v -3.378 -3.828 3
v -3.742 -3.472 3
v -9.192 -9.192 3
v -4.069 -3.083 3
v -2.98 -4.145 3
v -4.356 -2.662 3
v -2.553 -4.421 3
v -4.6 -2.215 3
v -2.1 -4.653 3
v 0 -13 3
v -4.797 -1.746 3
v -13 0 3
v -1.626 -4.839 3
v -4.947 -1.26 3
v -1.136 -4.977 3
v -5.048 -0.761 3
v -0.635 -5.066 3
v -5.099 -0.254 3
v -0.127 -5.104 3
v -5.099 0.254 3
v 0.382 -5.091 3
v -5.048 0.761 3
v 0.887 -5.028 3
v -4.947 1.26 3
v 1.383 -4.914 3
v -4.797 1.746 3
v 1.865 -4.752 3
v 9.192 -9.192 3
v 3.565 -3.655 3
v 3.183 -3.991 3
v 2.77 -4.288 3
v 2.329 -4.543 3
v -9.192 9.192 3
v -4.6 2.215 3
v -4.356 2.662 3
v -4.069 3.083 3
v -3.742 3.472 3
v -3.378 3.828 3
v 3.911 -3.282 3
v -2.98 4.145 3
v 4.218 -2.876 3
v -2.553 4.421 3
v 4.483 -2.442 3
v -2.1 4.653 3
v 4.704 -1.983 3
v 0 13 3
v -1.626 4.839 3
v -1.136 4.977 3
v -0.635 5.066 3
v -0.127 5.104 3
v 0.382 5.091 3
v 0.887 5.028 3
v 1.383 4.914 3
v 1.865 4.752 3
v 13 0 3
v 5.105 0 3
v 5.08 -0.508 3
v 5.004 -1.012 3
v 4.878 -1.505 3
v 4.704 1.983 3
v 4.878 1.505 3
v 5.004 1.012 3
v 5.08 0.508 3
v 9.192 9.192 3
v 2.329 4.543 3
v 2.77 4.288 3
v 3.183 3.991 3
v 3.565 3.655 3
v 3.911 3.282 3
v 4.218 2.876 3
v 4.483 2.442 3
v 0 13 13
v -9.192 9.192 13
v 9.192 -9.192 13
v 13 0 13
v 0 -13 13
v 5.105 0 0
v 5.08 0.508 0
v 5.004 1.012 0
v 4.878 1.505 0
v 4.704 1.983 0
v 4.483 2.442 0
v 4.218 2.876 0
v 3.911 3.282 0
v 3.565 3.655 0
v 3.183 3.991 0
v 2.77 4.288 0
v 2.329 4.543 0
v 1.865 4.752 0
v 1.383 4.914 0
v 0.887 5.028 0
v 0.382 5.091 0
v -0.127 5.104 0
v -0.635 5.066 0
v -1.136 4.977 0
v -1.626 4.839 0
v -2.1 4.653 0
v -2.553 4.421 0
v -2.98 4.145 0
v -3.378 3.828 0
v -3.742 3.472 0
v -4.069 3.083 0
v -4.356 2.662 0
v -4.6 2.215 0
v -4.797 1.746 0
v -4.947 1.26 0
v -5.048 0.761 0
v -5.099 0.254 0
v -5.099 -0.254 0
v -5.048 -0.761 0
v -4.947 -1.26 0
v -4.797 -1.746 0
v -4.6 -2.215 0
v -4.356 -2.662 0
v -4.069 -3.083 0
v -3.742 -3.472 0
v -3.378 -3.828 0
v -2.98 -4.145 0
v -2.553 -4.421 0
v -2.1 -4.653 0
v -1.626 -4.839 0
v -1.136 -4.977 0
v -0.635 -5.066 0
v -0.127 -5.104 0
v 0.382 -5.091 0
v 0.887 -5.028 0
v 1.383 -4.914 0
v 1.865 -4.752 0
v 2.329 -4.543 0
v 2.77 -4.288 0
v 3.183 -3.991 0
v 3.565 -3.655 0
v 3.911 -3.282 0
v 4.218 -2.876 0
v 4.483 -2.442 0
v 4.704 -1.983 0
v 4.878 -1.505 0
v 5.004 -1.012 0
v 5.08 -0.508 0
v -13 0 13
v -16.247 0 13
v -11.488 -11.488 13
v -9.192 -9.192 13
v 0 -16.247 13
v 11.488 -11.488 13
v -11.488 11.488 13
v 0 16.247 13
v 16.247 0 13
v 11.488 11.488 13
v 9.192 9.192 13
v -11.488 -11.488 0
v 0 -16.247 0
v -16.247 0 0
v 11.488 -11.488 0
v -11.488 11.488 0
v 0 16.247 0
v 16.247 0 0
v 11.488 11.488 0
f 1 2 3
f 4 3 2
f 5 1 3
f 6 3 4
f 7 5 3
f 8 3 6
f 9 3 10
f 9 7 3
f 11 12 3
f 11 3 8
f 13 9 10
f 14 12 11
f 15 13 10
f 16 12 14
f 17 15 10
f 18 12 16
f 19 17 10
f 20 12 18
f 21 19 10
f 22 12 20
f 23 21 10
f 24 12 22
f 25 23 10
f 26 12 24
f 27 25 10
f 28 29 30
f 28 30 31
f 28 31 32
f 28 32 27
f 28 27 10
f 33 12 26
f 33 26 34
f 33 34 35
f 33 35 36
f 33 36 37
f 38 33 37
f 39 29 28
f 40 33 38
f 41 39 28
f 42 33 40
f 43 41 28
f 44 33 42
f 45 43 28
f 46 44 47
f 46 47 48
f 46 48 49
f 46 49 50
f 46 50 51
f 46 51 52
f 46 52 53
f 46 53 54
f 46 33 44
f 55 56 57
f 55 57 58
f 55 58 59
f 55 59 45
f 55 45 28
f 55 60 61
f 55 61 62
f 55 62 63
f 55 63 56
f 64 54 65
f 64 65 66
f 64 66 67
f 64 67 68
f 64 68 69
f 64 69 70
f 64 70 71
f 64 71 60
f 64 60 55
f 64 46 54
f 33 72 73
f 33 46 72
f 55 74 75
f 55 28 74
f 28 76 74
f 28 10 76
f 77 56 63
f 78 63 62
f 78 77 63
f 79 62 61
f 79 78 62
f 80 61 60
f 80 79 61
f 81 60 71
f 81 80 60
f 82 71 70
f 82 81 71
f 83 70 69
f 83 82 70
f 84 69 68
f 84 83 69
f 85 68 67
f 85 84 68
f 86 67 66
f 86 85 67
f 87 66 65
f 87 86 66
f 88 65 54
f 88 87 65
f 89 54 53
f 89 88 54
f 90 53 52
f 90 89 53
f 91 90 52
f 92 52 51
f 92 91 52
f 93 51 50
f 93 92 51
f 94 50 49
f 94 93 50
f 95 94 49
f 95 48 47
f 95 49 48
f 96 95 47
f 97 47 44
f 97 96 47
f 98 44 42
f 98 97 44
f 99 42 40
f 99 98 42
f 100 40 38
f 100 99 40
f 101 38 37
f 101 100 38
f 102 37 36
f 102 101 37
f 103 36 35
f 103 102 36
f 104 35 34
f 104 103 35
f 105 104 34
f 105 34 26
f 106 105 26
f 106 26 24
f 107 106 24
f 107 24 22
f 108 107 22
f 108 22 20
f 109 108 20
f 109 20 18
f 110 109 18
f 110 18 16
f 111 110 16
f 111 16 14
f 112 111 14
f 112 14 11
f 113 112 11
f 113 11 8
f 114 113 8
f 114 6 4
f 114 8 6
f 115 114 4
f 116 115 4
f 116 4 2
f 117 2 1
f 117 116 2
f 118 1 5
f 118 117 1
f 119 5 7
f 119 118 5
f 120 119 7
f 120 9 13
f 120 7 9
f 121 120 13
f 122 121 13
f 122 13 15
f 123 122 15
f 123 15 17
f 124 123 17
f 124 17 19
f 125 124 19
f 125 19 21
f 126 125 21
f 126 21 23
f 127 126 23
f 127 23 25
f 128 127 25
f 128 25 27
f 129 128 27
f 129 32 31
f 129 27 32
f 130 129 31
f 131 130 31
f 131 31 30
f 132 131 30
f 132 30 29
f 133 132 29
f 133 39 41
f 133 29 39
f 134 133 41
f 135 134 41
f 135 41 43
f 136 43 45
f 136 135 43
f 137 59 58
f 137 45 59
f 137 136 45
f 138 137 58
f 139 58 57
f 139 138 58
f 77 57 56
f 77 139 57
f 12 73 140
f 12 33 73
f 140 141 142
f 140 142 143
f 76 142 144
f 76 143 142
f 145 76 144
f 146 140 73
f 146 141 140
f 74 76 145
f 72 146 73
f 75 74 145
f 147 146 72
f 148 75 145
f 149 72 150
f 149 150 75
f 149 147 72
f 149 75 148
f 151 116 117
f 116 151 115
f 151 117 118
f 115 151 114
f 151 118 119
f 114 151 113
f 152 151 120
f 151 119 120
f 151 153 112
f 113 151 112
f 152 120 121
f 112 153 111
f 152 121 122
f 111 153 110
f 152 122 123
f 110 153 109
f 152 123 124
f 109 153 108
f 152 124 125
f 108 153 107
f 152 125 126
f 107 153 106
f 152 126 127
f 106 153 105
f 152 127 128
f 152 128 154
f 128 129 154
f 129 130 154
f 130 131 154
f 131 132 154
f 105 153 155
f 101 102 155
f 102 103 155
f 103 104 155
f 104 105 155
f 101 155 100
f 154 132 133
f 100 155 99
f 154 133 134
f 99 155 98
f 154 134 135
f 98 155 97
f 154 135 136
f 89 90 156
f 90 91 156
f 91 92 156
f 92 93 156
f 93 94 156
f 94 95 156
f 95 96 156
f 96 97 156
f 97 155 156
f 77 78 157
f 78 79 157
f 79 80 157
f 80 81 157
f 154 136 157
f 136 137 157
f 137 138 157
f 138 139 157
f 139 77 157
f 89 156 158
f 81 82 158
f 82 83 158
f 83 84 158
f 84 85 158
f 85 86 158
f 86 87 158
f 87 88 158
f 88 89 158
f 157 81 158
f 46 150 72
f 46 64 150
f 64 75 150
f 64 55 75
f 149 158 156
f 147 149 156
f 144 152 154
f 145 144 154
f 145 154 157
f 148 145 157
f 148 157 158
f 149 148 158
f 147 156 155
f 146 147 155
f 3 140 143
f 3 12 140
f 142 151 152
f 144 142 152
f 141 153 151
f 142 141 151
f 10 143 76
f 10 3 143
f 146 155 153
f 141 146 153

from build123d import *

# Parameters (mm, degrees)
F2_DEPTH = 13
F3_T     = -3
F4_R     = 5.105166
F5_DEPTH = 25


with BuildPart() as f2:
    # F1 (on Top) → F2 (new body)
    with BuildSketch(Plane.XY):
        Polygon((-11.488489, 11.488489), (-16.247177, 0), (-11.488489, -11.488489), (0, -16.247177), (11.488489, -11.488489), (16.247177, 0), (11.488489, 11.488489), (0, 16.247177), align=None)
    extrude(amount=F2_DEPTH)

    # F3
    f3_openings = [f2.faces().sort_by_distance(p)[0] for p in [
        (0, 0, 13),
    ]]
    offset(amount=F3_T, openings=f3_openings)

    # F4 (on Top) → F5 (cut)
    with BuildSketch(Plane.XY):
        Circle(F4_R)
    extrude(amount=F5_DEPTH, mode=Mode.SUBTRACT)


solid = f2.part
